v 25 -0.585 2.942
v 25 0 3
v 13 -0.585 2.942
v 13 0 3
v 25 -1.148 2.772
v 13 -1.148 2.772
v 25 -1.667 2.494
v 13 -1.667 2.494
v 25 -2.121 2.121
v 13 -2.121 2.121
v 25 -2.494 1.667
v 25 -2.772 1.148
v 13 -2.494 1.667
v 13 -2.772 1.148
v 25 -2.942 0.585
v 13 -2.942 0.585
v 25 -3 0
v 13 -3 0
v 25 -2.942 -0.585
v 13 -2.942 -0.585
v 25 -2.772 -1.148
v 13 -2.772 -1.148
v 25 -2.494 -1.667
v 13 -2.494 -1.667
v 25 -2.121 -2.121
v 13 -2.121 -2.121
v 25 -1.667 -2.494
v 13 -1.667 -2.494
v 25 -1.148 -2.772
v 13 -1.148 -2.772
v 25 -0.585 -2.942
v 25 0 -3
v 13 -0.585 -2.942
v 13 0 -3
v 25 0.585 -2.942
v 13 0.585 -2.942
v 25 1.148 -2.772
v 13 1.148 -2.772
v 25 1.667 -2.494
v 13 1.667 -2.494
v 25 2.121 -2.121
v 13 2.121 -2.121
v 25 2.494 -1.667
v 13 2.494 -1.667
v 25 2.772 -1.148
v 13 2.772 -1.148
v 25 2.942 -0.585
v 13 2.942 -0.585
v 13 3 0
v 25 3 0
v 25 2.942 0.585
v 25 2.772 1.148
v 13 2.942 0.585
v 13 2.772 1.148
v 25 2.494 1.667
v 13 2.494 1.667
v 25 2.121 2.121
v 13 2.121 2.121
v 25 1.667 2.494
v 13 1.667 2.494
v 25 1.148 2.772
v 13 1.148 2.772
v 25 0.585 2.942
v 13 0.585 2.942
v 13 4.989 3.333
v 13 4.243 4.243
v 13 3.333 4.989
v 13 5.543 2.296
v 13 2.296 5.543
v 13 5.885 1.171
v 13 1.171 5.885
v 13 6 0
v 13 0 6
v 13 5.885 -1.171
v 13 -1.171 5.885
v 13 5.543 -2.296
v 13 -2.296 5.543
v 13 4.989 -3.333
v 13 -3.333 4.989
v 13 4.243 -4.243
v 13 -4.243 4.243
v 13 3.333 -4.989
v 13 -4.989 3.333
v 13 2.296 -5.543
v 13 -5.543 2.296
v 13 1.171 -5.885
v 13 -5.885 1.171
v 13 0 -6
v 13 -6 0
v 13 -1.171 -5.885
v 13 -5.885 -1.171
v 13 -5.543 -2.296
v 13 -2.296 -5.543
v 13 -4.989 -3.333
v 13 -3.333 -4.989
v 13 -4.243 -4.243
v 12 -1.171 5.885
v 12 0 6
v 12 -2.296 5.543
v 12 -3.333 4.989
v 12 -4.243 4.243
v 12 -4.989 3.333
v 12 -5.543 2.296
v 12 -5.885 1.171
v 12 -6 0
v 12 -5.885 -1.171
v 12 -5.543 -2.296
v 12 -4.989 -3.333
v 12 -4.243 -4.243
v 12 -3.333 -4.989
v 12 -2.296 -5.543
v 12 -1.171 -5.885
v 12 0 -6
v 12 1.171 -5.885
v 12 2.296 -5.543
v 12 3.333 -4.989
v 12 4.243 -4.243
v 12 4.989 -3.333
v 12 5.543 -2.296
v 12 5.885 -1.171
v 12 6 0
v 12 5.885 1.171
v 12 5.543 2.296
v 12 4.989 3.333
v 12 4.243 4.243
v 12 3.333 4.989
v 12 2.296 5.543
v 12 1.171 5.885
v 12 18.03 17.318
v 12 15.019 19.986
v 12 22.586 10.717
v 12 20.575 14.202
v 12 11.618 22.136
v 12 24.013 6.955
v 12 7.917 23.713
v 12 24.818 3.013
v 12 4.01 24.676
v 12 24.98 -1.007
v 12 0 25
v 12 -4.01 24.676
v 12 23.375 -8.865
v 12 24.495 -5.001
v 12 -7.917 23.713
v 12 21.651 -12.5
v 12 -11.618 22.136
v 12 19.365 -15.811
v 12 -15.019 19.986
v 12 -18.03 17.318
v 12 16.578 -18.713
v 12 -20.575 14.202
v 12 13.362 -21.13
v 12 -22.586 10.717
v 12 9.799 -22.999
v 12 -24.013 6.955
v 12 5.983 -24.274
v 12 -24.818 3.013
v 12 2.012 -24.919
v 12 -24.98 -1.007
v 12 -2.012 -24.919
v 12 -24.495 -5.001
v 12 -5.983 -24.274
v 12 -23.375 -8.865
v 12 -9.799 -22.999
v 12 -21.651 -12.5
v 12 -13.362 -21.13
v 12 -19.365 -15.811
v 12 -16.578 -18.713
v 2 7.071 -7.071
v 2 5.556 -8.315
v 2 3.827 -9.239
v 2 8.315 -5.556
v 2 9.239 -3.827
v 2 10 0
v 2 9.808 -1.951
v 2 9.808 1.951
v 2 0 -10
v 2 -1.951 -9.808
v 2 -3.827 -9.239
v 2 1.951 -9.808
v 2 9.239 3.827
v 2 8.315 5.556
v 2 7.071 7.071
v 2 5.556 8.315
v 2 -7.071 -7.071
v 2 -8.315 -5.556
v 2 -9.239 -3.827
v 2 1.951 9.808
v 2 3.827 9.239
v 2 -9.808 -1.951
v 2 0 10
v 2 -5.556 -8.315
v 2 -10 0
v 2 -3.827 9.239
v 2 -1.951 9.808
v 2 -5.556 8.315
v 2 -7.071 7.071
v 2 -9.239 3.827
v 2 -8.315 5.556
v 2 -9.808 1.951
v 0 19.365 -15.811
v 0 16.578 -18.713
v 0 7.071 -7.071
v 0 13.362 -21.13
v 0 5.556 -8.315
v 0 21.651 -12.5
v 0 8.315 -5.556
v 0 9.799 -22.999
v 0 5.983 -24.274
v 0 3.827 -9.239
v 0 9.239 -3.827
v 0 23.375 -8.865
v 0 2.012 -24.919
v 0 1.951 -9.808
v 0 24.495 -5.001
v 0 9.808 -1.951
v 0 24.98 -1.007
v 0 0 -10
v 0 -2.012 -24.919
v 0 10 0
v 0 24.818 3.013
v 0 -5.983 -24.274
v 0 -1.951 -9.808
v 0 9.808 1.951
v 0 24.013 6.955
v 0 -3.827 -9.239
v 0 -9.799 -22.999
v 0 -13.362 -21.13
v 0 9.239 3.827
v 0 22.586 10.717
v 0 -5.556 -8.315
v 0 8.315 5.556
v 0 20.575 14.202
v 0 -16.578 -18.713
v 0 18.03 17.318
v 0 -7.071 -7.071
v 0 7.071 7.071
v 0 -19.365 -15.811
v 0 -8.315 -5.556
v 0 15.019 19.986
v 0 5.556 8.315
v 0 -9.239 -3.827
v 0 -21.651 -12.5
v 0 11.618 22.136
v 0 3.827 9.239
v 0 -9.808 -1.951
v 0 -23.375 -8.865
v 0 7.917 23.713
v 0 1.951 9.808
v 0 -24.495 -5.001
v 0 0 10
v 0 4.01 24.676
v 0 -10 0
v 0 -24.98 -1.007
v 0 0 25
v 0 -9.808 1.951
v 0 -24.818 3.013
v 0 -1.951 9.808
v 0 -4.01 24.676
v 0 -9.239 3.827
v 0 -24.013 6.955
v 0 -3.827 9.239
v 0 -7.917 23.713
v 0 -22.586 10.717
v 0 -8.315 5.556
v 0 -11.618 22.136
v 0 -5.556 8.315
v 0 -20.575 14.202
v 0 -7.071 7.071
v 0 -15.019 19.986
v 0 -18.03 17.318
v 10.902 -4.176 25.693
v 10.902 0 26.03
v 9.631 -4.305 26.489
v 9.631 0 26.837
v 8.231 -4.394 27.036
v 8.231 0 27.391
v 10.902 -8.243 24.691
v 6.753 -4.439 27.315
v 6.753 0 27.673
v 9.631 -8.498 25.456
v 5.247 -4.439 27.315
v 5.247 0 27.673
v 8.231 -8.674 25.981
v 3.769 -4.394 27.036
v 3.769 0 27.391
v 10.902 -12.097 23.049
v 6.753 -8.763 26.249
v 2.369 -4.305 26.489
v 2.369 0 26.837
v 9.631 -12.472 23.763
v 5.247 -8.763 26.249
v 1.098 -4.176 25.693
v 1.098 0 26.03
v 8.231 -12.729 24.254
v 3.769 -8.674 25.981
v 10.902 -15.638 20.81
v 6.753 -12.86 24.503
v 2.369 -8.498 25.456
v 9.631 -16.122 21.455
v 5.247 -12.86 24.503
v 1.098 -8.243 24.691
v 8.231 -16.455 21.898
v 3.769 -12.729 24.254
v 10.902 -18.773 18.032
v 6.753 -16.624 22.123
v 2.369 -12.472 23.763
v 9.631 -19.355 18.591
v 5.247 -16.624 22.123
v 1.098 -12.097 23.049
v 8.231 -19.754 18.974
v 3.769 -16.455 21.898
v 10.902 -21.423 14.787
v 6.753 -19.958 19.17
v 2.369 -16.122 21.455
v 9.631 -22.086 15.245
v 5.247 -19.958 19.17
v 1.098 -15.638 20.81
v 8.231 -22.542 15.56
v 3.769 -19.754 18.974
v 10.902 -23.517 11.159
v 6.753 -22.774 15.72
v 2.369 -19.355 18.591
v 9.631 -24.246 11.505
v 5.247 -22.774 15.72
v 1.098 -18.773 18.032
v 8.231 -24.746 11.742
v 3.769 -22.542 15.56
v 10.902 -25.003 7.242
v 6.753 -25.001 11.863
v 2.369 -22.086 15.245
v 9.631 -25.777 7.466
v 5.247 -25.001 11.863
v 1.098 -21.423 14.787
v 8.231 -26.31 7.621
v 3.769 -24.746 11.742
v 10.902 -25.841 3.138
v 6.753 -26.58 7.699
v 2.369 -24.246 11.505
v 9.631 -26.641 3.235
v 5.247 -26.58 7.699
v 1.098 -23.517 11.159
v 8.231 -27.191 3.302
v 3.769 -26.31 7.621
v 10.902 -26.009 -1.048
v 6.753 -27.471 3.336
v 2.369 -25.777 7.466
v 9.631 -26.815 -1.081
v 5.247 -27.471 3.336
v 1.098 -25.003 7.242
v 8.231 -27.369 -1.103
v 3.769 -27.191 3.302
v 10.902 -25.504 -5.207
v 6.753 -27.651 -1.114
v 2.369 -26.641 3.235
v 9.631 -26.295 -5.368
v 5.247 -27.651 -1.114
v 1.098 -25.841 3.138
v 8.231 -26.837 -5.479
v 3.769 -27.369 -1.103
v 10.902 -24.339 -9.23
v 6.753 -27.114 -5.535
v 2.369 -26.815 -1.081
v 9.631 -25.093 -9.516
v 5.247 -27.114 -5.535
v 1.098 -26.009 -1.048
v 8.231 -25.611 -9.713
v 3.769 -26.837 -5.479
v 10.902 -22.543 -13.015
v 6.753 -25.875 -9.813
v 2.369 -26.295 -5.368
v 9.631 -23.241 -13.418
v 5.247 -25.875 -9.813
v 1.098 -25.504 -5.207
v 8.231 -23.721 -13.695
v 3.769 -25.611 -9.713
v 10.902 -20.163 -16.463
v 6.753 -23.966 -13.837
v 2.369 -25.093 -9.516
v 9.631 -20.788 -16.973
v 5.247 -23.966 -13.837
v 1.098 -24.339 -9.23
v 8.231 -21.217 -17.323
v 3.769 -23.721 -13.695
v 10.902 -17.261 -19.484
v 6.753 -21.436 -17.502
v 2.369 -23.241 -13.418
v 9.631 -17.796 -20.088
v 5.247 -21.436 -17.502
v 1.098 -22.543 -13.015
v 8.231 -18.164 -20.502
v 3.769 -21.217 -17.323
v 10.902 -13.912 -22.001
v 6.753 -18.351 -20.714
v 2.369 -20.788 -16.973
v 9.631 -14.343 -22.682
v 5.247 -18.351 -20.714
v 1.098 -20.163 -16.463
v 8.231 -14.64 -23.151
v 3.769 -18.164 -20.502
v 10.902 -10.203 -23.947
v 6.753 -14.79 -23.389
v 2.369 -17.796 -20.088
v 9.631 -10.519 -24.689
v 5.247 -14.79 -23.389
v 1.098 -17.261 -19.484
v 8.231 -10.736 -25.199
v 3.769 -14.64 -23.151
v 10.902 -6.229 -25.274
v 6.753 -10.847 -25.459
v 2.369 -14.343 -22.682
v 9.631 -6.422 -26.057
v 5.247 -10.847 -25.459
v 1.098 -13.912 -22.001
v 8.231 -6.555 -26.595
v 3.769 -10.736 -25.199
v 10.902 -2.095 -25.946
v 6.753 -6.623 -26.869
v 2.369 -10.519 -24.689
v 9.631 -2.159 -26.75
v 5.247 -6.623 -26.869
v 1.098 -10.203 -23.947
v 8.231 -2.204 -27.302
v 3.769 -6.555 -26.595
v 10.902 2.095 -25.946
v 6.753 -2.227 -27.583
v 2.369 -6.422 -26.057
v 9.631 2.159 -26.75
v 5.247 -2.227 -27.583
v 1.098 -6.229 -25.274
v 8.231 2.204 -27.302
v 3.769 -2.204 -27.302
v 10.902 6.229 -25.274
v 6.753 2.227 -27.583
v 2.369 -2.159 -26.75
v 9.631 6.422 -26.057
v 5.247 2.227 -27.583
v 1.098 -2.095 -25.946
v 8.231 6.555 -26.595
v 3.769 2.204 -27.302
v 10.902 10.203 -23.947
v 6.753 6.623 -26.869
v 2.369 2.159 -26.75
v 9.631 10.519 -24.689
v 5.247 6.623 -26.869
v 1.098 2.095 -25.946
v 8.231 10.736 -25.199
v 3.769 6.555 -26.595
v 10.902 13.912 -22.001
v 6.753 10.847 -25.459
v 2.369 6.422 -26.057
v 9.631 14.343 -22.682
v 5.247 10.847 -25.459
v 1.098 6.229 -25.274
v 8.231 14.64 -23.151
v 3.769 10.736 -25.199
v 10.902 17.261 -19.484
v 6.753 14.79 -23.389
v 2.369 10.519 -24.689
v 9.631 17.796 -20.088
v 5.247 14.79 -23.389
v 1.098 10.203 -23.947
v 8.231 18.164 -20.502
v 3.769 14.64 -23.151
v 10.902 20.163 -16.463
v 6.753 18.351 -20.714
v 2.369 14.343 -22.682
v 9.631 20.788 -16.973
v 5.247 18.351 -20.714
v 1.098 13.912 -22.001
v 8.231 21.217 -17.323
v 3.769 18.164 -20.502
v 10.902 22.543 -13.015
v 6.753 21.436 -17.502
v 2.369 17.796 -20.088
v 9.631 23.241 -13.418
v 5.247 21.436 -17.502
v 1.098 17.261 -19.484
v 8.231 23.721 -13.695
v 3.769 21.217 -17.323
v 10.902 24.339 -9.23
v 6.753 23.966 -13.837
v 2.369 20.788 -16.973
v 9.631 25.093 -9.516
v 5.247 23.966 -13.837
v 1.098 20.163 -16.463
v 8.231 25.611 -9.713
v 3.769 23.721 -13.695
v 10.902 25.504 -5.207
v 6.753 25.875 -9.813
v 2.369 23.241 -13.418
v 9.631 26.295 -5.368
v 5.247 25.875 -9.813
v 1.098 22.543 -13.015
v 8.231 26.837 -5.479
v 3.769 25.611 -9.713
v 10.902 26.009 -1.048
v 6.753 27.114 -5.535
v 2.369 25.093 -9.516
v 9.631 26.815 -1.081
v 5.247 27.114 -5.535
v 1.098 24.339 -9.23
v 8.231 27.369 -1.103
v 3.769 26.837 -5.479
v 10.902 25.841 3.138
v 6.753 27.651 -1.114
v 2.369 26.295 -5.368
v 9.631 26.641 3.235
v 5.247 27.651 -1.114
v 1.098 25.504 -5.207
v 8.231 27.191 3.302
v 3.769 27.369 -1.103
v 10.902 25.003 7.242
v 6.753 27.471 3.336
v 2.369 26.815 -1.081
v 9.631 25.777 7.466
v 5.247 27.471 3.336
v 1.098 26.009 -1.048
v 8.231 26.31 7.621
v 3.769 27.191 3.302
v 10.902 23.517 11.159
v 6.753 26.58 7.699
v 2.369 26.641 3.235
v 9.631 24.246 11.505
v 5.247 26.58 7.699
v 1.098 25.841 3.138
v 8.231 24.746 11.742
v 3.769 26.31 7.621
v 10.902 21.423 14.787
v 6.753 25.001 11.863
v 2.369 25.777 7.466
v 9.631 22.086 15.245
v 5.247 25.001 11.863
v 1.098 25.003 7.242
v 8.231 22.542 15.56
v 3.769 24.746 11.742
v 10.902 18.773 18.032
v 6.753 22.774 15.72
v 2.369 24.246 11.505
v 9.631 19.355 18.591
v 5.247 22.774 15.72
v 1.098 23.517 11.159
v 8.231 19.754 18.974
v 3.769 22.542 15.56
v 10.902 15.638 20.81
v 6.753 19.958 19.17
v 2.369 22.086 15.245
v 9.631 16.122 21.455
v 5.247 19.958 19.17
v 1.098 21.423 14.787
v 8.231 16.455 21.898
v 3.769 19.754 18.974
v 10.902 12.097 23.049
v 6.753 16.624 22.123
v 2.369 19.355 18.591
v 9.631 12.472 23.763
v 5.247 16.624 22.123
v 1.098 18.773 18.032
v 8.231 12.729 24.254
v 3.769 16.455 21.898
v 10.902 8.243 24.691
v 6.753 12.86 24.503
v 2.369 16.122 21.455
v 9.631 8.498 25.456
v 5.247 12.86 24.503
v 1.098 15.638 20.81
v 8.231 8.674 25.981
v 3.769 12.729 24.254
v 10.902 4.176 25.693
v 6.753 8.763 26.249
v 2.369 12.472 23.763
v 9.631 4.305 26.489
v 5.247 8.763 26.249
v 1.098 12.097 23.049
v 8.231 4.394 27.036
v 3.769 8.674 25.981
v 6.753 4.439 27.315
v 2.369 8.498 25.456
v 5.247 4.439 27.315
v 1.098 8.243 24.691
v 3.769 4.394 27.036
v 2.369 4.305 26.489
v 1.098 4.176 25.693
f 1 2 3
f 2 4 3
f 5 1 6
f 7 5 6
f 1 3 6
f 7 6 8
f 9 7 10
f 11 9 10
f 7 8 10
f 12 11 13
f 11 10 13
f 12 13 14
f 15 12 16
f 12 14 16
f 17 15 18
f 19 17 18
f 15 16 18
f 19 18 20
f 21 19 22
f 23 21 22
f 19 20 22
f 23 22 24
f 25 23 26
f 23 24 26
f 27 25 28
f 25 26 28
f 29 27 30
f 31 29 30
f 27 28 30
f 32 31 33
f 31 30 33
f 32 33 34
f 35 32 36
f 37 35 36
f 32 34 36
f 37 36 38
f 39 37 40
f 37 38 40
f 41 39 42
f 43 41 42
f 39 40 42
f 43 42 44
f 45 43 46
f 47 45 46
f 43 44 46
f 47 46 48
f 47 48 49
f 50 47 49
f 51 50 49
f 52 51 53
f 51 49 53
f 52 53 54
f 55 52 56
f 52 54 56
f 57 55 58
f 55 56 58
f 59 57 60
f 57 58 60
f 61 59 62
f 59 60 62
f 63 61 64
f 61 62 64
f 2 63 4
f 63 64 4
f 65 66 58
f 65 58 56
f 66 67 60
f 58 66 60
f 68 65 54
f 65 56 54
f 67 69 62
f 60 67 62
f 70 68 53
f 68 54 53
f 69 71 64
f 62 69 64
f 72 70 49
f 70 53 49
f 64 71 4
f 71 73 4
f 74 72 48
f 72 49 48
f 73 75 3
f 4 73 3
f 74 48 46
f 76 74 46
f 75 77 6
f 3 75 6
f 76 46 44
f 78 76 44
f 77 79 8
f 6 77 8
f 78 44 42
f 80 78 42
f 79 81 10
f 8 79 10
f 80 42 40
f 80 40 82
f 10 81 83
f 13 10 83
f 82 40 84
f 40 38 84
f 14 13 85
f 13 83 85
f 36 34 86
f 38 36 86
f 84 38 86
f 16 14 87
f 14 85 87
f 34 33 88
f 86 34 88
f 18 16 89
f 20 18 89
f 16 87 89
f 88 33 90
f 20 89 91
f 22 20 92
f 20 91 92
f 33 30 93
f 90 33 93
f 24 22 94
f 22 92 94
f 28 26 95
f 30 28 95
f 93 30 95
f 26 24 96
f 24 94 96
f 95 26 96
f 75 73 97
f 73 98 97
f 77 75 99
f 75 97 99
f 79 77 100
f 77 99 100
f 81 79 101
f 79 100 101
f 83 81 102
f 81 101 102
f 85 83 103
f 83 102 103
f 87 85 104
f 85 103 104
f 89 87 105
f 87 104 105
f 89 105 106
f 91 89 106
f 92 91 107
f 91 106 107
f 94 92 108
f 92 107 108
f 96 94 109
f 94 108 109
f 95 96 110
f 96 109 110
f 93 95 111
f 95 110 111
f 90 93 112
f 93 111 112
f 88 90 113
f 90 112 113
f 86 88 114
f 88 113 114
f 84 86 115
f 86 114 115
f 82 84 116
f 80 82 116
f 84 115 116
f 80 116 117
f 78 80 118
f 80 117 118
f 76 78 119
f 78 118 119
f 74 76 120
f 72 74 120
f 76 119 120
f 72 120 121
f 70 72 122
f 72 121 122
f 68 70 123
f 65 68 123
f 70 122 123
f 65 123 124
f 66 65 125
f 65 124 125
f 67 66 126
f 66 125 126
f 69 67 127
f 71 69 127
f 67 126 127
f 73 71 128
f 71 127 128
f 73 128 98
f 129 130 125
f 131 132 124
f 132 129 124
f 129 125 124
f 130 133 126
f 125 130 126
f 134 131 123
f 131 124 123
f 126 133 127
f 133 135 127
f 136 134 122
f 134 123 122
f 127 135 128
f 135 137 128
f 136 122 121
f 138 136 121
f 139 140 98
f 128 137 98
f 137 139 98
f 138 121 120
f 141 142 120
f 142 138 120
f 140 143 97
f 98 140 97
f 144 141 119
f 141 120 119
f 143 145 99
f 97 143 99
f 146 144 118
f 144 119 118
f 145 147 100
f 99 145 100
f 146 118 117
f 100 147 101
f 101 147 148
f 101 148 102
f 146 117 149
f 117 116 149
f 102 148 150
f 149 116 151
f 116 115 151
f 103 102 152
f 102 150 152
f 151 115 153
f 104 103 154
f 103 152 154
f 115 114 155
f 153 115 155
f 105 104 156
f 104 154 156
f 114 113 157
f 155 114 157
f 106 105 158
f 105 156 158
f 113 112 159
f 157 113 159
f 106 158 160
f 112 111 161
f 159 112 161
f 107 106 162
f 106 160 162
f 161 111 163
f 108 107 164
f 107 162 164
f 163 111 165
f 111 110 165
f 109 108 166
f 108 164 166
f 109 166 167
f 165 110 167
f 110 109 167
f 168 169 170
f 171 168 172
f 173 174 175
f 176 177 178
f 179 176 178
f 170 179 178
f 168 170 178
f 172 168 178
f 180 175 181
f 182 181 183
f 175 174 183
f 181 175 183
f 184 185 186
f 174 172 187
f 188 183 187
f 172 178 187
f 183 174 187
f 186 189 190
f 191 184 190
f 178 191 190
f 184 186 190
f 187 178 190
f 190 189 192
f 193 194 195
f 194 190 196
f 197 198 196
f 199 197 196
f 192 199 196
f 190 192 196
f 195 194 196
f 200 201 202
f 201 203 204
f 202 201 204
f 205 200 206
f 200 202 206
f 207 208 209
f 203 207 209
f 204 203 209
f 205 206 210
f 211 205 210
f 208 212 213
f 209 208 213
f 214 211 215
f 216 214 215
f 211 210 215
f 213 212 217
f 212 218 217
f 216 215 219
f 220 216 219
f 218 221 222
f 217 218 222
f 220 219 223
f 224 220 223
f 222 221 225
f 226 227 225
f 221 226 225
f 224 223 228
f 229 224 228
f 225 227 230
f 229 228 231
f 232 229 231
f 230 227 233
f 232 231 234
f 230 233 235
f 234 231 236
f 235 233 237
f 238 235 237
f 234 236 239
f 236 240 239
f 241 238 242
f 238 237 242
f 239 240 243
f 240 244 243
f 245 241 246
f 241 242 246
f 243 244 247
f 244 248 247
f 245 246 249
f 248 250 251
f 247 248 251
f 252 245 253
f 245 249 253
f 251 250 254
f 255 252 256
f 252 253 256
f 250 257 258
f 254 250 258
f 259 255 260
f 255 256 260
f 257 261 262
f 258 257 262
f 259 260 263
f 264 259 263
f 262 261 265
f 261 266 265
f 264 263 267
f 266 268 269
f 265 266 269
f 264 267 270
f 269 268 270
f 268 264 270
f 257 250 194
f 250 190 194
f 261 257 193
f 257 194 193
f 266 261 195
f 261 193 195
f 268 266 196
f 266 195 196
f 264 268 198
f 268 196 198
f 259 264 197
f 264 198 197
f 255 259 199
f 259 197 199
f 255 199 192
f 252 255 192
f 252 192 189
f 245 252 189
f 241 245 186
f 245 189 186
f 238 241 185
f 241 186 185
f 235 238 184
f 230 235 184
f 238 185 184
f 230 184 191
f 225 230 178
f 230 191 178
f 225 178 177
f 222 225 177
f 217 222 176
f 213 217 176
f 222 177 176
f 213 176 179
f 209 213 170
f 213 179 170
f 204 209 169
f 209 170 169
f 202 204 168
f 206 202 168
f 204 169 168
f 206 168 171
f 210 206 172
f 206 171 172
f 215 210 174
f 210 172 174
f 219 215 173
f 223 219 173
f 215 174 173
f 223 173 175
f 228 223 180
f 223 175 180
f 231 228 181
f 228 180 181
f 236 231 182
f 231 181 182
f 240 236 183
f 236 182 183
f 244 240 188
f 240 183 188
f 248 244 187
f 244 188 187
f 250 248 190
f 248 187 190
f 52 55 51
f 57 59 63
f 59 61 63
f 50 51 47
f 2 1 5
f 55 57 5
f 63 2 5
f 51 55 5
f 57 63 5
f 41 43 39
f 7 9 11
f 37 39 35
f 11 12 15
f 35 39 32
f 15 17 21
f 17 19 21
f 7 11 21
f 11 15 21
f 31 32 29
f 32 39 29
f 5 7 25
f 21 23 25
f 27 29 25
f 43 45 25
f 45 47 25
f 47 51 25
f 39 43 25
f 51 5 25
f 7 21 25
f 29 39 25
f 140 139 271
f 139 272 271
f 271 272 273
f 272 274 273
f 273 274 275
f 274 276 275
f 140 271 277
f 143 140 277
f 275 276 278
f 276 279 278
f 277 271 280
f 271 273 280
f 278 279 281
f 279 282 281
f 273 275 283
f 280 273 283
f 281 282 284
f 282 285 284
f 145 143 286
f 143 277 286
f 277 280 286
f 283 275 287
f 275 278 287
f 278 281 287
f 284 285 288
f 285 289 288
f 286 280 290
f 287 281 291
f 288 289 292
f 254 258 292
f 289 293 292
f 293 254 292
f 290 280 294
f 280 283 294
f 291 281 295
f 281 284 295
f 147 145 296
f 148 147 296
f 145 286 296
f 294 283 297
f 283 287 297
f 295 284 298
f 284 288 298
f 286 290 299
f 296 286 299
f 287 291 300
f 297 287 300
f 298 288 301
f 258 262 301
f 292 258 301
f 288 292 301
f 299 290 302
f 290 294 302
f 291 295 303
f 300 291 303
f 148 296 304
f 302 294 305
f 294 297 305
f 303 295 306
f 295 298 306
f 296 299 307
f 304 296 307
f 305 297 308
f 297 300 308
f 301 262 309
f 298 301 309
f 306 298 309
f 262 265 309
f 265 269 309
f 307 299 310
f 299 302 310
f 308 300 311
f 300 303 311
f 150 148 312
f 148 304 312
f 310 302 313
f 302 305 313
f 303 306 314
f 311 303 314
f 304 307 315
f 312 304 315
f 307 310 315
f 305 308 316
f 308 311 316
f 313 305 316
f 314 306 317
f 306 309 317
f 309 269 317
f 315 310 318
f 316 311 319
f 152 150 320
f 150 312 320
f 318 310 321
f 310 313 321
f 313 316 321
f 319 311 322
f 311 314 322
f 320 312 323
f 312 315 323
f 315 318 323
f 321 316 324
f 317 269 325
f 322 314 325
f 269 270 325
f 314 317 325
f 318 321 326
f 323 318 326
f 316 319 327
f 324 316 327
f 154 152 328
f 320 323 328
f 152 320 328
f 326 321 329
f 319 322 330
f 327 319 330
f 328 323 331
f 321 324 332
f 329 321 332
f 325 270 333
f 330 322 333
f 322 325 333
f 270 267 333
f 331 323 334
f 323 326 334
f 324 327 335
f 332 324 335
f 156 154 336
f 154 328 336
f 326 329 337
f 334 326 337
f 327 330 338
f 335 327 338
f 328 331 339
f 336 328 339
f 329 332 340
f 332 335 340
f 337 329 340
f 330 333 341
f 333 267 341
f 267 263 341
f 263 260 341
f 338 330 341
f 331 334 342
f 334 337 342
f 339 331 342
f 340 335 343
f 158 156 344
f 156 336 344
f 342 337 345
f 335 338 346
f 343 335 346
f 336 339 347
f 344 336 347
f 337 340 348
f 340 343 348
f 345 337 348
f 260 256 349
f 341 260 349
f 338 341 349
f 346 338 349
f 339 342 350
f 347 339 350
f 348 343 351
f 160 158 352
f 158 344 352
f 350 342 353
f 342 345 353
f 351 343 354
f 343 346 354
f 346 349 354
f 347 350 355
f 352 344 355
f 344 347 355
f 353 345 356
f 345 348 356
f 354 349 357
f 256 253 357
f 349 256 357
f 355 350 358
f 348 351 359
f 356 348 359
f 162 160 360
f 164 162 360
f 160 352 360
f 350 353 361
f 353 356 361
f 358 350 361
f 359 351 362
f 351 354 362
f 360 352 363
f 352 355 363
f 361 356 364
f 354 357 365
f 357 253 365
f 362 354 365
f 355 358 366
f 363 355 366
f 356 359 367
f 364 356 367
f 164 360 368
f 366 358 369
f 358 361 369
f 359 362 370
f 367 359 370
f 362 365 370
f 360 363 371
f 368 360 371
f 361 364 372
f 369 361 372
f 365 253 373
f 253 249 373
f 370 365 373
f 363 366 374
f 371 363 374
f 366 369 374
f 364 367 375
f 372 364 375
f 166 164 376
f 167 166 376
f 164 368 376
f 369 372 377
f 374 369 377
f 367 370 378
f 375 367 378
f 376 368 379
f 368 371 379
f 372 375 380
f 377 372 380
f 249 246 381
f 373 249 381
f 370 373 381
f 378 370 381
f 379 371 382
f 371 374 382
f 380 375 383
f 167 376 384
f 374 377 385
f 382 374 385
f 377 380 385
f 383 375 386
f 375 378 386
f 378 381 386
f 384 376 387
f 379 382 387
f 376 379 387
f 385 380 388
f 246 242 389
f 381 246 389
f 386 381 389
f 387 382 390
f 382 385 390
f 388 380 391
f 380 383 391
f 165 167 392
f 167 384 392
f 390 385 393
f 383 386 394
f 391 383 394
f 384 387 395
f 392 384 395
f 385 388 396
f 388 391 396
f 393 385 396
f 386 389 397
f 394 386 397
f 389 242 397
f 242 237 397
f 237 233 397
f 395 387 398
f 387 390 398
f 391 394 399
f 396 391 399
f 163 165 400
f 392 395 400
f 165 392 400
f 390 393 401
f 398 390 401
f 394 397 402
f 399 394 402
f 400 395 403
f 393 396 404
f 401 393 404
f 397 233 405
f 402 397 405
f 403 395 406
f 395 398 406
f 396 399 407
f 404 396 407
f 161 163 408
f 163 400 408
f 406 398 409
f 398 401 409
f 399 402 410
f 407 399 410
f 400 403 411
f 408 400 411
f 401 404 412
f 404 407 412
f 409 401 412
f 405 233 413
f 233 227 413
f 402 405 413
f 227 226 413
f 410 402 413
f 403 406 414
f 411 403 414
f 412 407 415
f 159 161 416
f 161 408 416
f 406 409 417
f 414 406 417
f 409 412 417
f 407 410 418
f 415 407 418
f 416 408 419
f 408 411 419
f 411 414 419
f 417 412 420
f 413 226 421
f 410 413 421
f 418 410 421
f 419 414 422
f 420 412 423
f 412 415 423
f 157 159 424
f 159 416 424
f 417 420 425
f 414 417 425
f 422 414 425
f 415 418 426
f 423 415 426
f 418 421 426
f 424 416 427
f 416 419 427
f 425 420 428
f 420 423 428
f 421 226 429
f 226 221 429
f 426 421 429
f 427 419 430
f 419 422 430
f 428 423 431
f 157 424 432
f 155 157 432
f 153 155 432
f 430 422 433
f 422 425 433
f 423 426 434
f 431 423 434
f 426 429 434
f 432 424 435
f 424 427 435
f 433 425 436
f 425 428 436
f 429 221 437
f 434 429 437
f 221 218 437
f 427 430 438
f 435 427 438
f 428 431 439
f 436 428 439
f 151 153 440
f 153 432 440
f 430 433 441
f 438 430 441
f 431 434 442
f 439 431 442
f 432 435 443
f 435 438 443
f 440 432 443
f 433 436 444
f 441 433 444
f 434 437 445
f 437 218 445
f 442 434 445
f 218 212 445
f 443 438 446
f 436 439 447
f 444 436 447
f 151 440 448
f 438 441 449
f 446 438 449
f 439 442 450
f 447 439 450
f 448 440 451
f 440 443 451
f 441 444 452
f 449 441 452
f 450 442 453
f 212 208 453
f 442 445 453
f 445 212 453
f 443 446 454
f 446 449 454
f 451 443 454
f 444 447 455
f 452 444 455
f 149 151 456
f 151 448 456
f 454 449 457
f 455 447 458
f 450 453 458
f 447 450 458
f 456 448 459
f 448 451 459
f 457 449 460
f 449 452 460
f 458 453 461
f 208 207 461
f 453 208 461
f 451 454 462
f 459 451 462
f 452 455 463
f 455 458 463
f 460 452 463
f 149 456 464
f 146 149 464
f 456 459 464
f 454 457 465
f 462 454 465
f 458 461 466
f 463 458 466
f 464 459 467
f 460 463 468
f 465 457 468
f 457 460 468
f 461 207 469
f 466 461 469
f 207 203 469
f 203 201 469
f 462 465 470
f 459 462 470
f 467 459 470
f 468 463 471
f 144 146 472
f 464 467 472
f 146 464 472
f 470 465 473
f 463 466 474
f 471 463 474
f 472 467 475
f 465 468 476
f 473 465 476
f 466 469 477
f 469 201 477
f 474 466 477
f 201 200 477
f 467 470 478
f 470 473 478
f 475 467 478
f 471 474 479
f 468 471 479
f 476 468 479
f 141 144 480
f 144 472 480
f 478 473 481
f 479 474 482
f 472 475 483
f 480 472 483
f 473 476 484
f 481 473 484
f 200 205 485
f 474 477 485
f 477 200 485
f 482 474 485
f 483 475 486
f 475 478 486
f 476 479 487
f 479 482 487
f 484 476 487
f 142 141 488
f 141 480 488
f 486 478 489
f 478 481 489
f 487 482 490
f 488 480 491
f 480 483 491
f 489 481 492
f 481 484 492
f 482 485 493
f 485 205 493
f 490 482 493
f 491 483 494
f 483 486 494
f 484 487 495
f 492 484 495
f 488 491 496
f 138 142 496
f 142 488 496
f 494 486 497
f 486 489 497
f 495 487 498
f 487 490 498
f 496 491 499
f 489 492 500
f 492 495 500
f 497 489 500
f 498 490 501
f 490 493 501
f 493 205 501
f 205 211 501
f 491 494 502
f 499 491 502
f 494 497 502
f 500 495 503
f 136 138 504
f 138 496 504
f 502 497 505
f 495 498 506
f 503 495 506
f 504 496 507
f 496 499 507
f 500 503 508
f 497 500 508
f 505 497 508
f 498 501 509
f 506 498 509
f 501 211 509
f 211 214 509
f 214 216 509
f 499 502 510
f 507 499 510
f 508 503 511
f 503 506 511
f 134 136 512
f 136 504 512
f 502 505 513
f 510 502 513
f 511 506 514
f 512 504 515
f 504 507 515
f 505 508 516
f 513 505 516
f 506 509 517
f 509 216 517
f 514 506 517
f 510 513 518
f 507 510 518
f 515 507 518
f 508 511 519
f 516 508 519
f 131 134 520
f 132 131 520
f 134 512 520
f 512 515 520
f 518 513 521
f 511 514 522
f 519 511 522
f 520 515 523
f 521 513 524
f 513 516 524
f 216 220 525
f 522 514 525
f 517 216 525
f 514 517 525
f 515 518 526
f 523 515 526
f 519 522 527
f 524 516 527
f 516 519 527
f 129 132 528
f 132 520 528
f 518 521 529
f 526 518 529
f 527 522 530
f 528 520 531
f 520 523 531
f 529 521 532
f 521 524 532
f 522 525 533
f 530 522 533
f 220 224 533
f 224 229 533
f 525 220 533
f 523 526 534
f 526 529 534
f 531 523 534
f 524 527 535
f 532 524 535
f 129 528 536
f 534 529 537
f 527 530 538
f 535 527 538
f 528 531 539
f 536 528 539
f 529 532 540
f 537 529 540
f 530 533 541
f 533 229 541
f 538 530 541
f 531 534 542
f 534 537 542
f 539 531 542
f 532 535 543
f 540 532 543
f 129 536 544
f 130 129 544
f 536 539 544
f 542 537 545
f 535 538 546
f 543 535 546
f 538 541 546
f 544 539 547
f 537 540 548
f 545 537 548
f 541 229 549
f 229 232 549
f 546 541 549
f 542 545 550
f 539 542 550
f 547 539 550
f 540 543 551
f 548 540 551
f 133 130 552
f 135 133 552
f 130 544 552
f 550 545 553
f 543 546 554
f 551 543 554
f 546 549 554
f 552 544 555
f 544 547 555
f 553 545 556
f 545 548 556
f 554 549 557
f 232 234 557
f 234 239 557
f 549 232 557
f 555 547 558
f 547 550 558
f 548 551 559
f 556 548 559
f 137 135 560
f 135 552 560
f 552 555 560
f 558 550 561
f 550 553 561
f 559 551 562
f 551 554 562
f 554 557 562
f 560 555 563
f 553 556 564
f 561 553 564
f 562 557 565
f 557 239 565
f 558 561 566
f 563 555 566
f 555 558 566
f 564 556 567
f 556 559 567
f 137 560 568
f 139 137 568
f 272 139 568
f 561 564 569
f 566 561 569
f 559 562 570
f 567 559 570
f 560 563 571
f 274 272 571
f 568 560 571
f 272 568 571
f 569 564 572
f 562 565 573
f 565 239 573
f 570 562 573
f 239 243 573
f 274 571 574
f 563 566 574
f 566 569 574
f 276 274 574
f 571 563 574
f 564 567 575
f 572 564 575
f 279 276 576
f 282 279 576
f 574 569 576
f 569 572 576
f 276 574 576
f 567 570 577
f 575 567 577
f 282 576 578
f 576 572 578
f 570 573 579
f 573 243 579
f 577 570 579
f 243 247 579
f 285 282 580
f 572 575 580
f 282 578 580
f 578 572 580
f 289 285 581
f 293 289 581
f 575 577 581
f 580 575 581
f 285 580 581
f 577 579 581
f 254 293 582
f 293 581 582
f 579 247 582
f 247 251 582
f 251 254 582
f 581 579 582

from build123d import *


with BuildPart() as part:
    # 草图1 → 旋转1 (revolve)
    with BuildSketch(Plane(origin=(0, 0, 0), x_dir=(1, 0, 0), z_dir=(0, 1, 0)), mode=Mode.PRIVATE) as revolve_1_sk:
        with BuildLine():
            Line((0, 25), (0, 10))
            Line((0, 10), (2, 10))
            Line((2, 10), (2, 0))
            Line((2, 0), (25, 0))
            Line((25, 0), (25, 3))
            Line((25, 3), (13, 3))
            Line((13, 3), (13, 6))
            Line((13, 6), (12, 6))
            Line((12, 6), (12, 25))
            ThreePointArc((12, 25), (6, 27.708497378), (0, 25))
        make_face()
    revolve(revolve_1_sk.sketch.rotate(Axis((0, 0, 0), (1, 0, 0)), 180), axis=Axis((0, 0, 0), (1, 0, 0)))


solid = part.part
